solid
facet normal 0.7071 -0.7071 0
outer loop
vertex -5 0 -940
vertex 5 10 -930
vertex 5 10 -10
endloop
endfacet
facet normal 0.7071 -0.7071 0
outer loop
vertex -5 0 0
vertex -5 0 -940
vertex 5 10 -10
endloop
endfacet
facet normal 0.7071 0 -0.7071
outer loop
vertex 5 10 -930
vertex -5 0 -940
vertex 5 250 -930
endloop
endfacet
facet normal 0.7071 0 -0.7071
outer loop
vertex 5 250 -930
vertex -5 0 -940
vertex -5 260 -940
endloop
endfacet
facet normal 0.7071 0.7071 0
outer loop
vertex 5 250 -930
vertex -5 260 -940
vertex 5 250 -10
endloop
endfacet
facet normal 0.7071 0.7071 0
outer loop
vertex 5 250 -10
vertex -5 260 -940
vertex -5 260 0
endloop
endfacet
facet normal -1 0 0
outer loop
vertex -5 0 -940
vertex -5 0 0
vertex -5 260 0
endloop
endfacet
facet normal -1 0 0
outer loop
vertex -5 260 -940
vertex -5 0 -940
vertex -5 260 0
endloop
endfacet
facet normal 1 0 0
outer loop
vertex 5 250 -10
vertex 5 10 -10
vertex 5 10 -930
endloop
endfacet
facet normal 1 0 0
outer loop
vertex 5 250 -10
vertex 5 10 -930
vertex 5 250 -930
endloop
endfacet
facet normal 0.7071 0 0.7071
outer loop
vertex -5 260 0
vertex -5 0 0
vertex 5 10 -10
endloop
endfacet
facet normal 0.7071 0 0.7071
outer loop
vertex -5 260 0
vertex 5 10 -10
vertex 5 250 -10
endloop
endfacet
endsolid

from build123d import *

# Parameters (mm, degrees)
F0_W     = 260
F0_H     = 940
F1_DEPTH = 5
F2_SIZE  = 9.99999


# Not quite as in the source:
# - a fillet or chamfer is up to 0.001 mm smaller than in the source, because OpenCascade refuses the exact size


with BuildPart() as f1:
    # F0 (on Right) → F1 (new body, symmetric)
    with BuildSketch(Plane.YZ):
        with Locations((130, -470)):
            Rectangle(F0_W, F0_H)
    extrude(amount=F1_DEPTH, both=True)

    # F2 (size 10 in the source; OpenCascade refuses exactly that, so slightly less here)
    f2_edges = [f1.edges().sort_by_distance(p)[0] for p in [
        (5, 0, -470),
        (5, 130, 0),
        (5, 260, -470),
        (5, 130, -940),
    ]]
    chamfer(f2_edges, length=F2_SIZE)


solid = f1.part
